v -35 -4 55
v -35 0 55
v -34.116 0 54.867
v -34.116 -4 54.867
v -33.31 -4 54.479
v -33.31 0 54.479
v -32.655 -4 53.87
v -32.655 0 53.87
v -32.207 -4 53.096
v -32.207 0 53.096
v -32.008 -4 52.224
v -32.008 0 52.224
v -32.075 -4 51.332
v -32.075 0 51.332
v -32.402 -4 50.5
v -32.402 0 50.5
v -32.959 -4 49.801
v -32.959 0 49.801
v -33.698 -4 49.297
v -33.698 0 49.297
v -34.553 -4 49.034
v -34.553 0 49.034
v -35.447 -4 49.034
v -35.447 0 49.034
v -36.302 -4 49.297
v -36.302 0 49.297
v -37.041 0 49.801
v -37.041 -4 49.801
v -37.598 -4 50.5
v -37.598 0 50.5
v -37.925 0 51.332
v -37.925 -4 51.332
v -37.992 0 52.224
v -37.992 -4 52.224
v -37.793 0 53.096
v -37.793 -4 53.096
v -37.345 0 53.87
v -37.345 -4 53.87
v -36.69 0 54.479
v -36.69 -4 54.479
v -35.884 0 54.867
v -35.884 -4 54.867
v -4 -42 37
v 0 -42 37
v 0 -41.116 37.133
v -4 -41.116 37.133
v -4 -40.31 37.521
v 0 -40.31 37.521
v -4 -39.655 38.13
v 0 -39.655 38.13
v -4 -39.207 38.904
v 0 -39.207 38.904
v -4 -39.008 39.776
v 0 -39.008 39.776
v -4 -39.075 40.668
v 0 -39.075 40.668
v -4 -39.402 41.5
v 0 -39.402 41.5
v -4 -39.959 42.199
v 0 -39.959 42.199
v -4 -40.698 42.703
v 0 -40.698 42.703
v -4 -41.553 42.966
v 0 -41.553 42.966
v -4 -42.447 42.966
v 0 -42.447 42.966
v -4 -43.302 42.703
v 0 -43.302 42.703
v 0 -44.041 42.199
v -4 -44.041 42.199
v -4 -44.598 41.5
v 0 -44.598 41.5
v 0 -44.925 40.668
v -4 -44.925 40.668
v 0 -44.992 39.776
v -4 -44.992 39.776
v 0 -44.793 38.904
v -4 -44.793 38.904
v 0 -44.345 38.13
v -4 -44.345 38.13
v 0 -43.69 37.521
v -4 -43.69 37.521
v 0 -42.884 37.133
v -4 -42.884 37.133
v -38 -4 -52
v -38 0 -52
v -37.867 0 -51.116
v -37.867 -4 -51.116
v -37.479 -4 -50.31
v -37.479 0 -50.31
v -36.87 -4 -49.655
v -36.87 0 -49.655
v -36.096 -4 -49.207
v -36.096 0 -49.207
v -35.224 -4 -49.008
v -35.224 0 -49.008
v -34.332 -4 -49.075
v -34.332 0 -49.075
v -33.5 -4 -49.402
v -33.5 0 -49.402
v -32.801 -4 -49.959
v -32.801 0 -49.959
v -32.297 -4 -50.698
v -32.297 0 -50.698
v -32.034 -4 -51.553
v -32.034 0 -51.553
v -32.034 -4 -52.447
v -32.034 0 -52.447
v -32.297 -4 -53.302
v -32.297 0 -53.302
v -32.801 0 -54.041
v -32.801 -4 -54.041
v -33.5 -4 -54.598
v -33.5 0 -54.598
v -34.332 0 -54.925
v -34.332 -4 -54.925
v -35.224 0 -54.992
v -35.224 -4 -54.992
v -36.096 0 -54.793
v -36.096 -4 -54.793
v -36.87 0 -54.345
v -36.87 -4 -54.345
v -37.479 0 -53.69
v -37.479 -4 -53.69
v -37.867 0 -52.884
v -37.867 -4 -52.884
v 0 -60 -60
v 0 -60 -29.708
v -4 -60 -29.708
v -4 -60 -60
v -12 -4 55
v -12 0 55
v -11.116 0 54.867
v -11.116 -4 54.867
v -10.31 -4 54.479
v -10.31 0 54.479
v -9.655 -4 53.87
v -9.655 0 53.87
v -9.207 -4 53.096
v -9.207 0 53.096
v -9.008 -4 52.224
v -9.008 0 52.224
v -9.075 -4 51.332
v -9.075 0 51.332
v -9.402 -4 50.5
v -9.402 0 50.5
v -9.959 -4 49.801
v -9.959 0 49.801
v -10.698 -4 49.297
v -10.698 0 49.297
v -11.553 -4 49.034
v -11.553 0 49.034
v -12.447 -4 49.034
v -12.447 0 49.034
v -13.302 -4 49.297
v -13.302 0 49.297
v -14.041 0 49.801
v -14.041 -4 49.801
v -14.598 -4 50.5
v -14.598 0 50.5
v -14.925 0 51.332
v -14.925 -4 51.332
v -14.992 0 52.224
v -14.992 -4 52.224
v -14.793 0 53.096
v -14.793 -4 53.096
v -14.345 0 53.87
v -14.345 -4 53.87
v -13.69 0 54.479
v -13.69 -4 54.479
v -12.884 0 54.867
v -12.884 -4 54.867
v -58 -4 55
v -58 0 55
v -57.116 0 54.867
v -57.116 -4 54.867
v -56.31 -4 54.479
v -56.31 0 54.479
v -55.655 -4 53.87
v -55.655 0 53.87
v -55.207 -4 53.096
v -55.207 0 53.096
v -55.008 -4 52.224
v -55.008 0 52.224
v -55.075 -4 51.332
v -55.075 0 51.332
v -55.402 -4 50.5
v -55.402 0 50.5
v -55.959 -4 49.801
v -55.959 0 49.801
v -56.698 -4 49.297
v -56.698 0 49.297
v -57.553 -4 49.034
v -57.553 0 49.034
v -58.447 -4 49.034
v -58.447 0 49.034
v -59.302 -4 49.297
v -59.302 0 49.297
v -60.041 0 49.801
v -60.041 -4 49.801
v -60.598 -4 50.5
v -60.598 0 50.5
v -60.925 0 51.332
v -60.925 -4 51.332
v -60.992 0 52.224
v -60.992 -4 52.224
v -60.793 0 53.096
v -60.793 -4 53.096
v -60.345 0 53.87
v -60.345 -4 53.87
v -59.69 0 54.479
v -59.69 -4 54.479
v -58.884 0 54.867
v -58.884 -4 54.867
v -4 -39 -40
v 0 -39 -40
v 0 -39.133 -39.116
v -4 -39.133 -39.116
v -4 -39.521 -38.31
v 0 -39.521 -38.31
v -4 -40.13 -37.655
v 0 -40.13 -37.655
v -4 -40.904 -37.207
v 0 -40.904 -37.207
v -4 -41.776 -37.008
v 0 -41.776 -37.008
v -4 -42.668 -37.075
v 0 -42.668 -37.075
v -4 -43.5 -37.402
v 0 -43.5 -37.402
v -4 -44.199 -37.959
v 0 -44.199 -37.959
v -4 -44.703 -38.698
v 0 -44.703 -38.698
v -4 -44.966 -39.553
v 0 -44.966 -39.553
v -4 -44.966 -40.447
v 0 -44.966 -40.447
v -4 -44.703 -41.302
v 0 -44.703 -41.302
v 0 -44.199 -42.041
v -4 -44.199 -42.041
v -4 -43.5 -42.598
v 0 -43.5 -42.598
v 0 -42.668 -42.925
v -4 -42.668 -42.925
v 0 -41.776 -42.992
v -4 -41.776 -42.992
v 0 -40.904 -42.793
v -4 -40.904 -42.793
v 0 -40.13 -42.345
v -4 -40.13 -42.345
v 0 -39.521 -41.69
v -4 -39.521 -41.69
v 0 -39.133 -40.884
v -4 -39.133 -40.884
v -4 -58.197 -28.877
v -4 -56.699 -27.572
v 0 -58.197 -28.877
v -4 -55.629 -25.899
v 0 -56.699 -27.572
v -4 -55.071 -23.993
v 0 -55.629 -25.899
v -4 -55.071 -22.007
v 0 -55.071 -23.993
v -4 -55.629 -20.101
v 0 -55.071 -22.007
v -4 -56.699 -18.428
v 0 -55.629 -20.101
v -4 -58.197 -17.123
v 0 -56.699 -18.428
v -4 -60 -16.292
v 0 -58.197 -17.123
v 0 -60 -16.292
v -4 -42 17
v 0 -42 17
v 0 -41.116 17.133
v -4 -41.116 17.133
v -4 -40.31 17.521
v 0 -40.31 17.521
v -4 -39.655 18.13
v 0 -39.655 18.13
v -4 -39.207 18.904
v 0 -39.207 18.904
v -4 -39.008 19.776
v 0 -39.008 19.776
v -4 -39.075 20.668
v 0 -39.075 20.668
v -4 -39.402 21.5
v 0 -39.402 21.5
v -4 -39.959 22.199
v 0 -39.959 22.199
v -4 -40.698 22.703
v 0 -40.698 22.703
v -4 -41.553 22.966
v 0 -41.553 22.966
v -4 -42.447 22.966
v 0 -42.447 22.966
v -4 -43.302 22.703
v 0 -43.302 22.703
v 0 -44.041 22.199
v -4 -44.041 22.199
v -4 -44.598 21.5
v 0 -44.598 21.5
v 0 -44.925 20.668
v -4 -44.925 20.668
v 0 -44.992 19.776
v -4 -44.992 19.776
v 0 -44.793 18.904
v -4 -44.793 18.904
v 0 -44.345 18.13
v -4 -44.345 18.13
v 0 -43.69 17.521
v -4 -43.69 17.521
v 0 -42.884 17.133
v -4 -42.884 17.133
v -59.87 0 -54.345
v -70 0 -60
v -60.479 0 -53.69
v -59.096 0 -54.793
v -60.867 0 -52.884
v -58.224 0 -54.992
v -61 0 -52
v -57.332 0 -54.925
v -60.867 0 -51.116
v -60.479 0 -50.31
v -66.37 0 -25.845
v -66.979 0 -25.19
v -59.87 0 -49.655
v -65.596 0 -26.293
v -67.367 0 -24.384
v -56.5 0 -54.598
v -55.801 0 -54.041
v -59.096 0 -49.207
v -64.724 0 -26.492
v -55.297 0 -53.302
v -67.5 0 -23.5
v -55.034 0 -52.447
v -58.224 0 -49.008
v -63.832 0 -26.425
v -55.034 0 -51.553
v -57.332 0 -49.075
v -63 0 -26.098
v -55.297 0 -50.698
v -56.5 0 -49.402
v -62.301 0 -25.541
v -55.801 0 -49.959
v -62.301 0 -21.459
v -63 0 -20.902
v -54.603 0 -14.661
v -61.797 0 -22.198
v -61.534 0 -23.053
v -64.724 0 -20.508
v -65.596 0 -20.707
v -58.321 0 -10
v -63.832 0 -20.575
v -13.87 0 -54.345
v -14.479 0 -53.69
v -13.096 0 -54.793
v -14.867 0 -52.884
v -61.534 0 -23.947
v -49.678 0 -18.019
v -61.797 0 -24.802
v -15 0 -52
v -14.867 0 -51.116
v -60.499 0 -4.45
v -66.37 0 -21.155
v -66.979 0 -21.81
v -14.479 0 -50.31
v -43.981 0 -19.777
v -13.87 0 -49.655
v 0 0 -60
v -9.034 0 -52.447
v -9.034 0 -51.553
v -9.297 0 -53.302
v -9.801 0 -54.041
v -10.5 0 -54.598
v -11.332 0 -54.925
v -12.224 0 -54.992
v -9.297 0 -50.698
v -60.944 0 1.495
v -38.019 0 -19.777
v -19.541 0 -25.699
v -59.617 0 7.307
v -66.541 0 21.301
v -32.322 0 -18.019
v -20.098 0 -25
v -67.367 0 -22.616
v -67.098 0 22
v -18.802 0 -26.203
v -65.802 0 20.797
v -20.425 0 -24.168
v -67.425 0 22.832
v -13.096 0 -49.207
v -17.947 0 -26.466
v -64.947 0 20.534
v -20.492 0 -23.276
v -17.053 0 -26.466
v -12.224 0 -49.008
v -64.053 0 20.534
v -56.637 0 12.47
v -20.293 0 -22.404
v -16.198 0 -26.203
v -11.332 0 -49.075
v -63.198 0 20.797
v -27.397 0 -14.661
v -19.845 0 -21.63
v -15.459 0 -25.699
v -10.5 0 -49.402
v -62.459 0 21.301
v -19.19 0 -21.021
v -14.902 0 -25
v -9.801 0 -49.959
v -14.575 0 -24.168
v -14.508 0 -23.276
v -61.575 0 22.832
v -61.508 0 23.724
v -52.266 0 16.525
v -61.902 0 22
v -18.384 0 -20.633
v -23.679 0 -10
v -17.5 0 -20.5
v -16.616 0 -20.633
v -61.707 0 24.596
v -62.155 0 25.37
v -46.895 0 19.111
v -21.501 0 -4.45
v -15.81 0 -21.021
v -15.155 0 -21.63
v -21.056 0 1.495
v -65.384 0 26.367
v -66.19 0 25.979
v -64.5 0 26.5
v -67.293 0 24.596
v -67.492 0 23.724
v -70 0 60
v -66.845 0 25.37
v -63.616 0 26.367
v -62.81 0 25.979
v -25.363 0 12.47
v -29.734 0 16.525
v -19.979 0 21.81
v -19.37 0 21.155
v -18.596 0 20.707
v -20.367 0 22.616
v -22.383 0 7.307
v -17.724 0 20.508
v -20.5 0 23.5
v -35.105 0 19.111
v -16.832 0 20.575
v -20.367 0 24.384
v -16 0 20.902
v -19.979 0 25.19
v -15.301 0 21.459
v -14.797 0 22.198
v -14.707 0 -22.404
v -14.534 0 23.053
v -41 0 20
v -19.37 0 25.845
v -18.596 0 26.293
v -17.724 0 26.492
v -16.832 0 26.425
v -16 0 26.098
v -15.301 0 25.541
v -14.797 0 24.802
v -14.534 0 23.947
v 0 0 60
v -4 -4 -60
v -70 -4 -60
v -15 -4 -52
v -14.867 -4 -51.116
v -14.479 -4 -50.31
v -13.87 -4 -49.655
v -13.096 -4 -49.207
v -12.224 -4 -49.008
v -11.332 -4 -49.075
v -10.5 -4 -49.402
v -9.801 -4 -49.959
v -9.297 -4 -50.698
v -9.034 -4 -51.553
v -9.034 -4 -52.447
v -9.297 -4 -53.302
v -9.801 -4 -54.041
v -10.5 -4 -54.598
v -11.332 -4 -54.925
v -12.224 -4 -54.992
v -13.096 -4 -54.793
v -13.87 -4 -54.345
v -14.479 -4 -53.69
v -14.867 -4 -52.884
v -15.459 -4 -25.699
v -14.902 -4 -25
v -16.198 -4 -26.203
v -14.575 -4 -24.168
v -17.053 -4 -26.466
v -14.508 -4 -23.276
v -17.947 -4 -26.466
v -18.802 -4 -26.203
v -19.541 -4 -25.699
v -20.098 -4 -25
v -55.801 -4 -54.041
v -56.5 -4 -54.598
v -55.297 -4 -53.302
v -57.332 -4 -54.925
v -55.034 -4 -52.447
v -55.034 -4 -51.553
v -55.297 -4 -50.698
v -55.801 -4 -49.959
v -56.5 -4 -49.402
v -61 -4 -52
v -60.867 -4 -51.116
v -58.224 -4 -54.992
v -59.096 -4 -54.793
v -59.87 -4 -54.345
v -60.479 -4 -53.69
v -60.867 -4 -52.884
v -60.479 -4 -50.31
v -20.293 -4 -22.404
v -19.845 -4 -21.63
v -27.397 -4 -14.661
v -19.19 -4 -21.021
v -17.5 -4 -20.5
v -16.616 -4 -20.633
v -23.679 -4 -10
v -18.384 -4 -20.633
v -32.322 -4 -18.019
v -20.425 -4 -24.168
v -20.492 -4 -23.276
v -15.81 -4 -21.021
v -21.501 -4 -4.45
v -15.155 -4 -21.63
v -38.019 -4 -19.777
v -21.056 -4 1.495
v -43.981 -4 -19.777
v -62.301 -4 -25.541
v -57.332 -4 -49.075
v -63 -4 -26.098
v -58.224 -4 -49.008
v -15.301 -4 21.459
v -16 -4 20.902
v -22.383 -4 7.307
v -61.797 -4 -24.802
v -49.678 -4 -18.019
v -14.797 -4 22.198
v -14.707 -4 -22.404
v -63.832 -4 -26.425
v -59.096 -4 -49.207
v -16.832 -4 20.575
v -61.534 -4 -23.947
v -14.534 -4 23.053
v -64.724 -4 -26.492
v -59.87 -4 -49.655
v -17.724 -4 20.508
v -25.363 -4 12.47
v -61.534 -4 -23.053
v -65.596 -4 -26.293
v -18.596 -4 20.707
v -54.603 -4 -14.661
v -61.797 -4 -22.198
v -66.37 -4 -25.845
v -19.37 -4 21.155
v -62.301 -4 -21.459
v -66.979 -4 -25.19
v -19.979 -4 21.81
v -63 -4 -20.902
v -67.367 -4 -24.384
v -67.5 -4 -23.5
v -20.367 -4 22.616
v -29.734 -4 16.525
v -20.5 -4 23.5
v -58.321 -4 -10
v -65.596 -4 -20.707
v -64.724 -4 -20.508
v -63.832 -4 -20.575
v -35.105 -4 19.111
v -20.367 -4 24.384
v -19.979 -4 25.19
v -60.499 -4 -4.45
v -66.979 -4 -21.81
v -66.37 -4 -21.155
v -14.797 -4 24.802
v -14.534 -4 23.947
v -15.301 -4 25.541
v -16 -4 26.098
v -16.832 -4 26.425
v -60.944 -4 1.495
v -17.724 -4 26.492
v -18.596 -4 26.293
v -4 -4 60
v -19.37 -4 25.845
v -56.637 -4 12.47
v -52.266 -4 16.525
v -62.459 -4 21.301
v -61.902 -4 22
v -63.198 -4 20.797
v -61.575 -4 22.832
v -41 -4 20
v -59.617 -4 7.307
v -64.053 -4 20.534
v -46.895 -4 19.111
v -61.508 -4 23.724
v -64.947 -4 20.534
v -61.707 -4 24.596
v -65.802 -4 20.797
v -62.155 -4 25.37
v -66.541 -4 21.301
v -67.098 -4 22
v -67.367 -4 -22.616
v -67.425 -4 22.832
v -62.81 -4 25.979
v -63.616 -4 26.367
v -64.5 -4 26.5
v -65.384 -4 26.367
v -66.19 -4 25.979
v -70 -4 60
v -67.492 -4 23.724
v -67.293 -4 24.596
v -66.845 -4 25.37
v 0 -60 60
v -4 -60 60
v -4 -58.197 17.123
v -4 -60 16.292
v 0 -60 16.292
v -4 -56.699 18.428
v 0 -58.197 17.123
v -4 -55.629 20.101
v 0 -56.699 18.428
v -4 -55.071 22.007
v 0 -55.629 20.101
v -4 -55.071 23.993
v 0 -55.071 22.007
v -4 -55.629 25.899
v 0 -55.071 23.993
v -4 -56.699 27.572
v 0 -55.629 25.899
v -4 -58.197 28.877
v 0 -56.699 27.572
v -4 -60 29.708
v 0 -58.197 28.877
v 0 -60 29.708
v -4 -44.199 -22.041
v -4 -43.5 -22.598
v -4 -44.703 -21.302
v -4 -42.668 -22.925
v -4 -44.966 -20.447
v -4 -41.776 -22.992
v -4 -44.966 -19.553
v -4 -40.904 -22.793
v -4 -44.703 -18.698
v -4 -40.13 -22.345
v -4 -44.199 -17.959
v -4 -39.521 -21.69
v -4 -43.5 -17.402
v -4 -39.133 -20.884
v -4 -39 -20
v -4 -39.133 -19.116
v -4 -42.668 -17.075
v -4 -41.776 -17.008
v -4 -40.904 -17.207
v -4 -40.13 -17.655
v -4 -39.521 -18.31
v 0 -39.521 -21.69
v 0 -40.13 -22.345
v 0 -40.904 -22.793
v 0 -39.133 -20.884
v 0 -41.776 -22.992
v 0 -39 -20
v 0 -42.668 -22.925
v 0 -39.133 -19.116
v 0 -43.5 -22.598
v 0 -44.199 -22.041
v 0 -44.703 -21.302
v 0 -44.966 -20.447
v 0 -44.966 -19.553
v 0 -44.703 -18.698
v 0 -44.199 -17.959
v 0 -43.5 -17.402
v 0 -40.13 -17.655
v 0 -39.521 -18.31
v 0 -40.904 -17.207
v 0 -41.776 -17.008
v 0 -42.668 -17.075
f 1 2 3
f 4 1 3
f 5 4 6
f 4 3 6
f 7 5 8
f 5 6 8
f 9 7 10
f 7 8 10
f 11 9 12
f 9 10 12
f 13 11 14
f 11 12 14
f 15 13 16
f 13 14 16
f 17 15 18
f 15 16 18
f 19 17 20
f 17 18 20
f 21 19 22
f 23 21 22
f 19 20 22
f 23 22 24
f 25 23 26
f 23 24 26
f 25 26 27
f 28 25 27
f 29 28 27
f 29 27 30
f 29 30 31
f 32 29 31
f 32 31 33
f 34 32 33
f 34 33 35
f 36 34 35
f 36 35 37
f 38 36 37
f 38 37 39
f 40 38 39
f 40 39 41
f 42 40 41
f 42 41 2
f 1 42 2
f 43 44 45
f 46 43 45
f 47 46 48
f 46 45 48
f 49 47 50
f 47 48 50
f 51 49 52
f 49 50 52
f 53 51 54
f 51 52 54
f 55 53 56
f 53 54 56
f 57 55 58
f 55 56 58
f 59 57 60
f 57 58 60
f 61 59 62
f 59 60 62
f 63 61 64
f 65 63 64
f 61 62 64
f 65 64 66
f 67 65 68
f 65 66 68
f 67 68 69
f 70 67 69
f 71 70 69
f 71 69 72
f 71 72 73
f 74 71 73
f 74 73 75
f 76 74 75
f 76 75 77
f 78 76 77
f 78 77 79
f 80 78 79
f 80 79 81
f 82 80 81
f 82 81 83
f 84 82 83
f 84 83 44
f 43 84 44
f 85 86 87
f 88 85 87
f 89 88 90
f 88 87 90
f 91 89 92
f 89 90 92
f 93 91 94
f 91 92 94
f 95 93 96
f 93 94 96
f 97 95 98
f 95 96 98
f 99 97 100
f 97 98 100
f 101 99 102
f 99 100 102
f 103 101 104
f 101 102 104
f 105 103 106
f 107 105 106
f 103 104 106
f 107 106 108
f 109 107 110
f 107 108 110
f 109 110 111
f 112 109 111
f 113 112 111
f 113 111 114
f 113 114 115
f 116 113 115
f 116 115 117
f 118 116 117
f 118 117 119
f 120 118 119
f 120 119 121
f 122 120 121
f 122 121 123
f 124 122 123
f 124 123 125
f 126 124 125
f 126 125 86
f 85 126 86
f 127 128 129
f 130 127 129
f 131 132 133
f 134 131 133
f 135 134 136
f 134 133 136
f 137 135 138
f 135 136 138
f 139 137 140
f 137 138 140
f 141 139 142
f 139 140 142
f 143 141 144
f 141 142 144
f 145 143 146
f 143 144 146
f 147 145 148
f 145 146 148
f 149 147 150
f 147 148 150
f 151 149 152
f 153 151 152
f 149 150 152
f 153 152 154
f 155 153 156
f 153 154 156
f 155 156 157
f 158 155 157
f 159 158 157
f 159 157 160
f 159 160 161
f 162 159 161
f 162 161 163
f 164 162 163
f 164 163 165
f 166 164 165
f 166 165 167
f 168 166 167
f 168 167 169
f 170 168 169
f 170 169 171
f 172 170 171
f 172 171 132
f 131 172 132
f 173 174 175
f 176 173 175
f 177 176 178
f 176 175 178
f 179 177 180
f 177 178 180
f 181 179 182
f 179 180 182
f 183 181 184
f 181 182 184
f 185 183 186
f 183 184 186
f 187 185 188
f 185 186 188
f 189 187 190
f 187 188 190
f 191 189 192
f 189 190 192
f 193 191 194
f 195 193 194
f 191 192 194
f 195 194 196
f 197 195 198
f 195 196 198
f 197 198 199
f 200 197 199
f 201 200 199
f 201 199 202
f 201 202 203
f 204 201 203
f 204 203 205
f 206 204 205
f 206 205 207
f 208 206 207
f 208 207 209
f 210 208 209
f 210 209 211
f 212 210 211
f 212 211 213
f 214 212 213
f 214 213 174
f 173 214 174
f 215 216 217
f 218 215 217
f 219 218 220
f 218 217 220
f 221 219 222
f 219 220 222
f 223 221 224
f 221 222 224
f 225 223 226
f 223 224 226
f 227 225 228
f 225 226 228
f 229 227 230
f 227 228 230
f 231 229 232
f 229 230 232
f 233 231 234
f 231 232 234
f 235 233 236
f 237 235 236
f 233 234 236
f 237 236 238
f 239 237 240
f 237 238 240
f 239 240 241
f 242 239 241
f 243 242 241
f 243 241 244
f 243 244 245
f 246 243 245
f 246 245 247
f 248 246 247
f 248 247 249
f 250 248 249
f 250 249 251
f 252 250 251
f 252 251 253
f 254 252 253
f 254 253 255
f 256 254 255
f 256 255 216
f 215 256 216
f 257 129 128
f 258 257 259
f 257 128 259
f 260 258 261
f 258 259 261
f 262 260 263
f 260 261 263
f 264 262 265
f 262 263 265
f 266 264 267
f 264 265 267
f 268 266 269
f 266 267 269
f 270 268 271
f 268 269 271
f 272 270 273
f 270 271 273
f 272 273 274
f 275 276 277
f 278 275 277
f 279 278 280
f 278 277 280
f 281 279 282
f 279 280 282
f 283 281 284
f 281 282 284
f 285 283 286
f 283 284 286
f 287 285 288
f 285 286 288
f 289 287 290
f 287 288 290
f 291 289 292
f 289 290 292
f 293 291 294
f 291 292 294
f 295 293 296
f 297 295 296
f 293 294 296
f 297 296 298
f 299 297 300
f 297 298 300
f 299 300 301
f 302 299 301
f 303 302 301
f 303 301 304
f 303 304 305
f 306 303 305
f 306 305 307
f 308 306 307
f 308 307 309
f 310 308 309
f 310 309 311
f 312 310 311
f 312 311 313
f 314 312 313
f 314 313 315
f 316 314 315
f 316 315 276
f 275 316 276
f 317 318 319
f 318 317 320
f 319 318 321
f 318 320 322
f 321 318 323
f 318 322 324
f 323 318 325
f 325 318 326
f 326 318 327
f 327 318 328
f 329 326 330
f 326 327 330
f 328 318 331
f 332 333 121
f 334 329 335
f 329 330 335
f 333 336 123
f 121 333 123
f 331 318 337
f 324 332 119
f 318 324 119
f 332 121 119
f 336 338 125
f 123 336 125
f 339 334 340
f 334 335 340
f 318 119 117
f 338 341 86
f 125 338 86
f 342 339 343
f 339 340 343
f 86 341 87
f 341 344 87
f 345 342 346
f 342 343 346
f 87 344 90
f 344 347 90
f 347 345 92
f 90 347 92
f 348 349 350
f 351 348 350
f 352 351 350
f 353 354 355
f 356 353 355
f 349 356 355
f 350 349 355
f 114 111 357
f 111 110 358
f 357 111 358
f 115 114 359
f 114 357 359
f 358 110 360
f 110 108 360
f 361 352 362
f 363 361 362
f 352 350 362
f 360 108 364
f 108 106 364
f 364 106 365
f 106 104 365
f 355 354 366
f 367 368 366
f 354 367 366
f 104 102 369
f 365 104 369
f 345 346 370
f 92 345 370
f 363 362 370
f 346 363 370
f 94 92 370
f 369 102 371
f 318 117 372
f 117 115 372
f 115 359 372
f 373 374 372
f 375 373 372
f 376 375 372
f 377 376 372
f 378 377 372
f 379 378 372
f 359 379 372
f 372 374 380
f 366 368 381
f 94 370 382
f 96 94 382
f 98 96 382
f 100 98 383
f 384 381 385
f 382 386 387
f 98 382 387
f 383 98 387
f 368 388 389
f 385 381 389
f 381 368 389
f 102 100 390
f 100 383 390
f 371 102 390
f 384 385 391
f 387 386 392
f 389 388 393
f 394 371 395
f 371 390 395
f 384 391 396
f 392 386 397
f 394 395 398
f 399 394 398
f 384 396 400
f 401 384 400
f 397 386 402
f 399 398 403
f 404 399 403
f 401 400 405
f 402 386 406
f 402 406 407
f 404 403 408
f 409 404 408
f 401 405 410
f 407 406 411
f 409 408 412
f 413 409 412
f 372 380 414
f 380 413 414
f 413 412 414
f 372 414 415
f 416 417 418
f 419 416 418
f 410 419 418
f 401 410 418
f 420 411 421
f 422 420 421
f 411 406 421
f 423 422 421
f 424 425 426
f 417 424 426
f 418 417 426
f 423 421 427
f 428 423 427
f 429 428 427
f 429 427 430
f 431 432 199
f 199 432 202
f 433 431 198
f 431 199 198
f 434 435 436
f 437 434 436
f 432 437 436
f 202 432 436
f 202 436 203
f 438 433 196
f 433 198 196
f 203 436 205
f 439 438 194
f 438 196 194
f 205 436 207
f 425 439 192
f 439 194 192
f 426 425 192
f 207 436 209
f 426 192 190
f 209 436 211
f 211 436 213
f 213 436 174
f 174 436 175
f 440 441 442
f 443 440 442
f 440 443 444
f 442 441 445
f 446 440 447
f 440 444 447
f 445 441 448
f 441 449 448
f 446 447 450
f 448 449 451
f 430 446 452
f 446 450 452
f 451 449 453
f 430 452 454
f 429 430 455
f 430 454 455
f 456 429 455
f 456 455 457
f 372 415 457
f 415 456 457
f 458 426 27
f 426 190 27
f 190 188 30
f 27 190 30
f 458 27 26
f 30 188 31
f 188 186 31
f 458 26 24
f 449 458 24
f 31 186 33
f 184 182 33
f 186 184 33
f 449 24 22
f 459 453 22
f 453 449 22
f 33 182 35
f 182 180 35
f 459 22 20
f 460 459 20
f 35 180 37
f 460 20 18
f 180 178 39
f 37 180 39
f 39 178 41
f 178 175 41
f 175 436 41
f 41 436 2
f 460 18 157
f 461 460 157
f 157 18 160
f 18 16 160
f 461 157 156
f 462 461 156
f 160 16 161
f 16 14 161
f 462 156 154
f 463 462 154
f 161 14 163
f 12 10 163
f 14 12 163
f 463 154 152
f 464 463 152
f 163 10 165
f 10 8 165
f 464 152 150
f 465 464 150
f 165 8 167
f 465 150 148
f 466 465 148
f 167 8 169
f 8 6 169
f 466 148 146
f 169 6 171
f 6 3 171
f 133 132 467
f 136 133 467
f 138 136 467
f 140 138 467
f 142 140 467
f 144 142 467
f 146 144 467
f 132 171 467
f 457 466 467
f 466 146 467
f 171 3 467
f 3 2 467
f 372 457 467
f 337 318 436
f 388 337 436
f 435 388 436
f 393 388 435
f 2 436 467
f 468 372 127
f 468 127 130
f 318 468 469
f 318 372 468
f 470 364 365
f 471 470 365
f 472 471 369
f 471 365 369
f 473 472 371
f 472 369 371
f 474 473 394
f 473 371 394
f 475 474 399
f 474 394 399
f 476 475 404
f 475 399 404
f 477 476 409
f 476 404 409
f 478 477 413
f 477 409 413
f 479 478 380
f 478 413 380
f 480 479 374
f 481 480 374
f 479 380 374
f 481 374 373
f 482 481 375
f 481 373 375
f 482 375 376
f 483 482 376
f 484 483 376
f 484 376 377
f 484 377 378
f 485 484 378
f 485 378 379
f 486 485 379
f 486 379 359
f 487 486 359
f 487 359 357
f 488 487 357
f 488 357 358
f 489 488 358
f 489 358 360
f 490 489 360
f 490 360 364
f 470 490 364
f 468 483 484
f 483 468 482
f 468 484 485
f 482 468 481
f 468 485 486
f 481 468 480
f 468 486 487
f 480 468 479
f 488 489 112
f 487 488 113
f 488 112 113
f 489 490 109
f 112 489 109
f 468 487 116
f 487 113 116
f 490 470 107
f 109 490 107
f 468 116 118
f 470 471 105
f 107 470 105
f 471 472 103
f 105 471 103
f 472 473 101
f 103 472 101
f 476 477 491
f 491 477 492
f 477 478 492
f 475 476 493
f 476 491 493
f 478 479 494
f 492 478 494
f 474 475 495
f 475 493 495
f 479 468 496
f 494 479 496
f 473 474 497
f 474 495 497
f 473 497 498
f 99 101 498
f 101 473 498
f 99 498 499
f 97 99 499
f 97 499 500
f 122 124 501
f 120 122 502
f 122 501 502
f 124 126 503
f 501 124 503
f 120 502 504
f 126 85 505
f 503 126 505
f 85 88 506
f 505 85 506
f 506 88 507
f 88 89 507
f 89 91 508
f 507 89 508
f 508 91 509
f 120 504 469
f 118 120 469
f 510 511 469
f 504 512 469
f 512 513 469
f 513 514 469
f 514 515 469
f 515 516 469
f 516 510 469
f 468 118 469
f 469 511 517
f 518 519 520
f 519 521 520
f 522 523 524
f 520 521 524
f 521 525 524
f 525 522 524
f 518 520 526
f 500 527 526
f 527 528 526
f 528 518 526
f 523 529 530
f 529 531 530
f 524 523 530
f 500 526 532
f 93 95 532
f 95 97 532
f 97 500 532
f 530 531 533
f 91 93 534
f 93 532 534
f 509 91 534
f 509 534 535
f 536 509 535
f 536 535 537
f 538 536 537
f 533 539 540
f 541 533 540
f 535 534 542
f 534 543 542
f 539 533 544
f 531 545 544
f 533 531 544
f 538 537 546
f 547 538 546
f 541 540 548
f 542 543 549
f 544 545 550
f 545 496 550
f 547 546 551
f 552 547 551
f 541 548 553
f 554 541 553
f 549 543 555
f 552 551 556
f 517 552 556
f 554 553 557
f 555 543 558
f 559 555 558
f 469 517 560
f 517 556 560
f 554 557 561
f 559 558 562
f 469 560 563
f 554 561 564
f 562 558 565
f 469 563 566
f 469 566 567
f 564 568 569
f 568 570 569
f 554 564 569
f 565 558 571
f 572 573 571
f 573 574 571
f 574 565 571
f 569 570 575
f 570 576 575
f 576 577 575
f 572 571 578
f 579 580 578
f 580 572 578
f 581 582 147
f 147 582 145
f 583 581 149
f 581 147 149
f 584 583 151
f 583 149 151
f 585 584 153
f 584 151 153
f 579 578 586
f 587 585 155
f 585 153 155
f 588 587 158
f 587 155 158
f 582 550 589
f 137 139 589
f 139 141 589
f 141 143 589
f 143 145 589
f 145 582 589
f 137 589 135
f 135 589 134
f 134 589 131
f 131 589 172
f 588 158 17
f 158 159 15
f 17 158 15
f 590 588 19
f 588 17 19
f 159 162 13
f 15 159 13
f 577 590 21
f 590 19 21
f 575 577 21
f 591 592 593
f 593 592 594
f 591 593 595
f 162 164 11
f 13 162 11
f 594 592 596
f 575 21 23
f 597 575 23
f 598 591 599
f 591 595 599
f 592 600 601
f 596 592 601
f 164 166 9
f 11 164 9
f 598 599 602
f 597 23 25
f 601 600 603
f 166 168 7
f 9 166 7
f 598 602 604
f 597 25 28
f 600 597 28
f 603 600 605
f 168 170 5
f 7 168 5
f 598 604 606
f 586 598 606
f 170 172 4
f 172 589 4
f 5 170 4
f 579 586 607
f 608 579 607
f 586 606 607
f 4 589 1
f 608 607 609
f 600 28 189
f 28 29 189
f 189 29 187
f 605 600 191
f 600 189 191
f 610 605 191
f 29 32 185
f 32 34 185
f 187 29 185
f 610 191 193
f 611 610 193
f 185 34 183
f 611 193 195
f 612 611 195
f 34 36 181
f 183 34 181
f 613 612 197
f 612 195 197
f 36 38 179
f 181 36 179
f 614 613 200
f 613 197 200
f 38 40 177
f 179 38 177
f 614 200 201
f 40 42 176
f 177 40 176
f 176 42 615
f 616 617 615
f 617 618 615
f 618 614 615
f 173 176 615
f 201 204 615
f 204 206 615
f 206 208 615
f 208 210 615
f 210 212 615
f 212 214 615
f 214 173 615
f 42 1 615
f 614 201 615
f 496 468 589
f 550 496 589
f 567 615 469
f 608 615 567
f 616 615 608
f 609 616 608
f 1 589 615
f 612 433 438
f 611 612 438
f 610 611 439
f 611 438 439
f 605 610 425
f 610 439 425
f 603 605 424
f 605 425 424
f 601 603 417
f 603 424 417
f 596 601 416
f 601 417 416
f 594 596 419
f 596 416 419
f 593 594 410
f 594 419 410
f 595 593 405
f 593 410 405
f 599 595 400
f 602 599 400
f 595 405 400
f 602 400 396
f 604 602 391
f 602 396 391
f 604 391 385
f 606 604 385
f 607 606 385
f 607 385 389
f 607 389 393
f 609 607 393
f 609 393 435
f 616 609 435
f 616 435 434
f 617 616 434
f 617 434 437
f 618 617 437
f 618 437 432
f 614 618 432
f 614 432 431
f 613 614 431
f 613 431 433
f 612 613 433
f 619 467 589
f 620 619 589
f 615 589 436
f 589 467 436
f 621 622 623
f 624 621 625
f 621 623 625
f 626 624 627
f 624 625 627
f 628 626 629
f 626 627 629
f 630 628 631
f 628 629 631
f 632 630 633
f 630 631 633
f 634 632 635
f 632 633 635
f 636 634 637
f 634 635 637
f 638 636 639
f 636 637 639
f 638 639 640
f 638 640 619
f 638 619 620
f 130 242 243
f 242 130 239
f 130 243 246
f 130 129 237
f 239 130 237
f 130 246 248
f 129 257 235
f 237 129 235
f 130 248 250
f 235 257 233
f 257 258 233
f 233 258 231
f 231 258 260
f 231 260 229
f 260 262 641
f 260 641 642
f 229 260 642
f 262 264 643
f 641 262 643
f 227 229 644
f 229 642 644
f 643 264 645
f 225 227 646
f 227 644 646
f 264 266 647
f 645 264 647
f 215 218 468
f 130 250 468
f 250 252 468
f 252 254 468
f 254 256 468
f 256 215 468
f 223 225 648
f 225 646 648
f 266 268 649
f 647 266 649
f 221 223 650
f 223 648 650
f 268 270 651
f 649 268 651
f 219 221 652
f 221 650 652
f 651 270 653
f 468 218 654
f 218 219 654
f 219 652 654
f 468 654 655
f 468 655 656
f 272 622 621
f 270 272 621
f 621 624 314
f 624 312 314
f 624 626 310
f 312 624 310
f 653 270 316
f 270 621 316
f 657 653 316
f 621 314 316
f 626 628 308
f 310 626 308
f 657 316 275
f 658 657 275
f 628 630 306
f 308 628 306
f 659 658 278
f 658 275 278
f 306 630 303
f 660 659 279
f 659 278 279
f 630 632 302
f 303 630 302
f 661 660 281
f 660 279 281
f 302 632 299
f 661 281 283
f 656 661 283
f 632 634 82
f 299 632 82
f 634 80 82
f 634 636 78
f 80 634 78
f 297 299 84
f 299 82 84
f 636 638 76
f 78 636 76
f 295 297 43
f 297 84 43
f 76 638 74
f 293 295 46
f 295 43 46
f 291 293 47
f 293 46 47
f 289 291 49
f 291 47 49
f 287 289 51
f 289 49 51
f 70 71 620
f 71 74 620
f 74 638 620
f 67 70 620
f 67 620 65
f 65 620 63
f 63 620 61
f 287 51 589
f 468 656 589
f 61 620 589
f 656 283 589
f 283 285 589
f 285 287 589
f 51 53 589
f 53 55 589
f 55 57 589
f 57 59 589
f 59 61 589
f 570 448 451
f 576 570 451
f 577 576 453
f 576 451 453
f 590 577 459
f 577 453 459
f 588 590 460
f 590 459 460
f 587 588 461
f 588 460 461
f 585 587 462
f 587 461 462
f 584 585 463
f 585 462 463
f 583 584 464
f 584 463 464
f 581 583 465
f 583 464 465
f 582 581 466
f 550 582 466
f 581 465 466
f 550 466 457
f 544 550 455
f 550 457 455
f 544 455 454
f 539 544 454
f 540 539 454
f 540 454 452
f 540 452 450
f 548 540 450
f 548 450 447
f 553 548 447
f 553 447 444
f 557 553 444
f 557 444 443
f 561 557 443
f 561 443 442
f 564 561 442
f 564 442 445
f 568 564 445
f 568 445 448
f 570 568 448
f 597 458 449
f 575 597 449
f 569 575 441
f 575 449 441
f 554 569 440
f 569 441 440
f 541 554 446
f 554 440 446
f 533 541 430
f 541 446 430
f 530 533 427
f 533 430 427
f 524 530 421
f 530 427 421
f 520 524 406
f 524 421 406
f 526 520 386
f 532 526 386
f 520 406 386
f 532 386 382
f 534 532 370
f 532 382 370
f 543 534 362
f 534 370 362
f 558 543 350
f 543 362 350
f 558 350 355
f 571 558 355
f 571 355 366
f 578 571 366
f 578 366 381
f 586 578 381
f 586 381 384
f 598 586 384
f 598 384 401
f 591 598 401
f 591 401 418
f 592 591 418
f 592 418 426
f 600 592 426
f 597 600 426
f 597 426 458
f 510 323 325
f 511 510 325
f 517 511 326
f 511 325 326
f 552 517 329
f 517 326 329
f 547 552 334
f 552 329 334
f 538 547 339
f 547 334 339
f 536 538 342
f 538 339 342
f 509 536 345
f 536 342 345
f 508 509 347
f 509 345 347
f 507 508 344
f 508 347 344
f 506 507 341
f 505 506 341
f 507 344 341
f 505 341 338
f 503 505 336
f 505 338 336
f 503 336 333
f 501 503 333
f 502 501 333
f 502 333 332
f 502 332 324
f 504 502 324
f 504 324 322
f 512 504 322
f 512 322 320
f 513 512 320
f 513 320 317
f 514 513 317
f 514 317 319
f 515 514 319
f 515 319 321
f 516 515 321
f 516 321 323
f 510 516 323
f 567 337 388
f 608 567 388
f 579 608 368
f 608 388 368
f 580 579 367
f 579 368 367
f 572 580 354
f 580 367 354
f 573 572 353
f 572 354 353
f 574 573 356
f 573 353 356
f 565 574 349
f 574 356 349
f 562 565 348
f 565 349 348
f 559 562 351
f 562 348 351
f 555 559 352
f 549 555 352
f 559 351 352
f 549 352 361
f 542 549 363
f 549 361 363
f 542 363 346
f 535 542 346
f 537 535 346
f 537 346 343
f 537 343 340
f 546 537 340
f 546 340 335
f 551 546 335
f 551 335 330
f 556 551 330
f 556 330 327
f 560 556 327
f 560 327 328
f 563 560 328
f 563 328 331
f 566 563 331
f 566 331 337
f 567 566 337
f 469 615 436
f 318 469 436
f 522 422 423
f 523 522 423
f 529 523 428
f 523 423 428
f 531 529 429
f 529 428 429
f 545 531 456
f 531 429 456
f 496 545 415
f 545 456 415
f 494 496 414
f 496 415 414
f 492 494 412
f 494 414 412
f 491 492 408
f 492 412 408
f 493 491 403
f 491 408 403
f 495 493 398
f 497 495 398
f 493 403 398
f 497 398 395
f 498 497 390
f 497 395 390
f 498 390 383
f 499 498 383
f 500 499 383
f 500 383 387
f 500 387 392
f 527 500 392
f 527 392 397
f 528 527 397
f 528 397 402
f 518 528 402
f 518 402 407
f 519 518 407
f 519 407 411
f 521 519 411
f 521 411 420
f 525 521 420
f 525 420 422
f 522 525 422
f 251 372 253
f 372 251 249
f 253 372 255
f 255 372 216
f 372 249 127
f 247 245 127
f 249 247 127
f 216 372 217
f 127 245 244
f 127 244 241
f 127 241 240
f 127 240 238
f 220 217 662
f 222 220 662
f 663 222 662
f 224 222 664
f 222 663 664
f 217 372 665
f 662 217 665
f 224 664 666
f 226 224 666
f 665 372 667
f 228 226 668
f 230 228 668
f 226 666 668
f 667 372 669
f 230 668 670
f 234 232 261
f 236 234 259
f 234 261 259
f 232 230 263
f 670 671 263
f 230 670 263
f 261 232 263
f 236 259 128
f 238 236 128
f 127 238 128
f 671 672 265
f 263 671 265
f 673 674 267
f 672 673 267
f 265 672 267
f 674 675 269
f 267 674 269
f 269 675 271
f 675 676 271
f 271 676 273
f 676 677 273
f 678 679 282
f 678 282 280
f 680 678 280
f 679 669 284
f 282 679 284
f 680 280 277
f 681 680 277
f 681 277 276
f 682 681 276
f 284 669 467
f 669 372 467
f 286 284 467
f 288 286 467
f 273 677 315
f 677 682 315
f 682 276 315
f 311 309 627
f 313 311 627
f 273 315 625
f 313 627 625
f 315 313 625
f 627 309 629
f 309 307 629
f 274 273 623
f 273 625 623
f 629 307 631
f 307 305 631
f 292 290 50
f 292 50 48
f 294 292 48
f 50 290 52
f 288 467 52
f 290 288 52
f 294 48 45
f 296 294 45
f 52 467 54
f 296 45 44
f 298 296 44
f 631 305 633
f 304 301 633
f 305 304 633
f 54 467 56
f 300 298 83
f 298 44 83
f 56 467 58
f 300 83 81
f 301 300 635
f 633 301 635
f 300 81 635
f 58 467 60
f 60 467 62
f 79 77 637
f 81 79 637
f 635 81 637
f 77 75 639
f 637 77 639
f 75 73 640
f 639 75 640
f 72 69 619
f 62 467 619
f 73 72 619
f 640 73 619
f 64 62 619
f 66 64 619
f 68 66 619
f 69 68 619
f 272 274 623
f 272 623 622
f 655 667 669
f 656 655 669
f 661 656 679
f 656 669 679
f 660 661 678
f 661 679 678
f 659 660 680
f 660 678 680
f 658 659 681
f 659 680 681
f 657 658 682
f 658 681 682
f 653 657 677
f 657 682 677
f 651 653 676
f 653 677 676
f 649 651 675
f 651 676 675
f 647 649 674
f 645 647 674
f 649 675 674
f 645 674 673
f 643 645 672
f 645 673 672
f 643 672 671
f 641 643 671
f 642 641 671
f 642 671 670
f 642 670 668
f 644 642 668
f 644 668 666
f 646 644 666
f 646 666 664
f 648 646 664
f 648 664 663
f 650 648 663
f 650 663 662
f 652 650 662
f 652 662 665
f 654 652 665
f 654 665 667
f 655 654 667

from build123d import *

# Parameters (mm, degrees)
AUFSATZ_LINEAR_AUSTRAGEN1_DEPTH = 60
SKIZZE2_R                       = 20
SKIZZE2_R_2                     = 3
SCHNITT_LINEAR_AUSTRAGEN1_DEPTH = 20
SKIZZE3_R                       = 3
SCHNITT_LINEAR_AUSTRAGEN2_DEPTH = 20
SKIZZE4_R                       = 7
SCHNITT_LINEAR_AUSTRAGEN3_DEPTH = 10
SKIZZE5_R                       = 3
SCHNITT_LINEAR_AUSTRAGEN4_DEPTH = 10


with BuildPart() as part:
    # Skizze1 → Aufsatz-Linear austragen1 (new, symmetric)
    with BuildSketch(Plane.XY):
        Polygon((-70, 0), (0, 0), (0, -60), (-4, -60), (-4, -4), (-70, -4), align=None)
    extrude(amount=AUFSATZ_LINEAR_AUSTRAGEN1_DEPTH, both=True)

    # Skizze2 → Schnitt-Linear austragen1 (cut)
    with BuildSketch(Plane(origin=(0, 0, 0), x_dir=(1, 0, 0), z_dir=(0, 1, 0))):
        with Locations((-41, 0)):
            Circle(SKIZZE2_R)
        with Locations((-17.5, 23.5)):
            Circle(SKIZZE2_R_2)
        with Locations((-64.5, 23.5)):
            Circle(SKIZZE2_R_2)
        with Locations((-17.5, -23.5)):
            Circle(SKIZZE2_R_2)
        with Locations((-64.5, -23.5)):
            Circle(SKIZZE2_R_2)
    extrude(amount=-SCHNITT_LINEAR_AUSTRAGEN1_DEPTH, mode=Mode.SUBTRACT)

    # Skizze3 → Schnitt-Linear austragen2 (cut)
    with BuildSketch(Plane(origin=(0, 0, 0), x_dir=(0, 0, -1), z_dir=(1, 0, 0))):
        with Locations((40, -42)):
            Circle(SKIZZE3_R)
        with Locations((-40, -42)):
            Circle(SKIZZE3_R)
        with Locations((20, -42)):
            Circle(SKIZZE3_R)
        with Locations((-20, -42)):
            Circle(SKIZZE3_R)
    extrude(amount=-SCHNITT_LINEAR_AUSTRAGEN2_DEPTH, mode=Mode.SUBTRACT)

    # Skizze4 → Schnitt-Linear austragen3 (cut)
    with BuildSketch(Plane(origin=(0, 0, 0), x_dir=(0, 0, -1), z_dir=(1, 0, 0))):
        with Locations((23, -62)):
            Circle(SKIZZE4_R)
        with Locations((-23, -62)):
            Circle(SKIZZE4_R)
    extrude(amount=-SCHNITT_LINEAR_AUSTRAGEN3_DEPTH, mode=Mode.SUBTRACT)

    # Skizze5 → Schnitt-Linear austragen4 (cut)
    with BuildSketch(Plane(origin=(0, 0, 0), x_dir=(1, 0, 0), z_dir=(0, 1, 0))):
        with Locations((-58, -52)):
            Circle(SKIZZE5_R)
        with Locations((-35, -52)):
            Circle(SKIZZE5_R)
        with Locations((-12, -52)):
            Circle(SKIZZE5_R)
        with Locations((-58, 52)):
            Circle(SKIZZE5_R)
        with Locations((-35, 52)):
            Circle(SKIZZE5_R)
        with Locations((-12, 52)):
            Circle(SKIZZE5_R)
    extrude(amount=-SCHNITT_LINEAR_AUSTRAGEN4_DEPTH, mode=Mode.SUBTRACT)


solid = part.part
